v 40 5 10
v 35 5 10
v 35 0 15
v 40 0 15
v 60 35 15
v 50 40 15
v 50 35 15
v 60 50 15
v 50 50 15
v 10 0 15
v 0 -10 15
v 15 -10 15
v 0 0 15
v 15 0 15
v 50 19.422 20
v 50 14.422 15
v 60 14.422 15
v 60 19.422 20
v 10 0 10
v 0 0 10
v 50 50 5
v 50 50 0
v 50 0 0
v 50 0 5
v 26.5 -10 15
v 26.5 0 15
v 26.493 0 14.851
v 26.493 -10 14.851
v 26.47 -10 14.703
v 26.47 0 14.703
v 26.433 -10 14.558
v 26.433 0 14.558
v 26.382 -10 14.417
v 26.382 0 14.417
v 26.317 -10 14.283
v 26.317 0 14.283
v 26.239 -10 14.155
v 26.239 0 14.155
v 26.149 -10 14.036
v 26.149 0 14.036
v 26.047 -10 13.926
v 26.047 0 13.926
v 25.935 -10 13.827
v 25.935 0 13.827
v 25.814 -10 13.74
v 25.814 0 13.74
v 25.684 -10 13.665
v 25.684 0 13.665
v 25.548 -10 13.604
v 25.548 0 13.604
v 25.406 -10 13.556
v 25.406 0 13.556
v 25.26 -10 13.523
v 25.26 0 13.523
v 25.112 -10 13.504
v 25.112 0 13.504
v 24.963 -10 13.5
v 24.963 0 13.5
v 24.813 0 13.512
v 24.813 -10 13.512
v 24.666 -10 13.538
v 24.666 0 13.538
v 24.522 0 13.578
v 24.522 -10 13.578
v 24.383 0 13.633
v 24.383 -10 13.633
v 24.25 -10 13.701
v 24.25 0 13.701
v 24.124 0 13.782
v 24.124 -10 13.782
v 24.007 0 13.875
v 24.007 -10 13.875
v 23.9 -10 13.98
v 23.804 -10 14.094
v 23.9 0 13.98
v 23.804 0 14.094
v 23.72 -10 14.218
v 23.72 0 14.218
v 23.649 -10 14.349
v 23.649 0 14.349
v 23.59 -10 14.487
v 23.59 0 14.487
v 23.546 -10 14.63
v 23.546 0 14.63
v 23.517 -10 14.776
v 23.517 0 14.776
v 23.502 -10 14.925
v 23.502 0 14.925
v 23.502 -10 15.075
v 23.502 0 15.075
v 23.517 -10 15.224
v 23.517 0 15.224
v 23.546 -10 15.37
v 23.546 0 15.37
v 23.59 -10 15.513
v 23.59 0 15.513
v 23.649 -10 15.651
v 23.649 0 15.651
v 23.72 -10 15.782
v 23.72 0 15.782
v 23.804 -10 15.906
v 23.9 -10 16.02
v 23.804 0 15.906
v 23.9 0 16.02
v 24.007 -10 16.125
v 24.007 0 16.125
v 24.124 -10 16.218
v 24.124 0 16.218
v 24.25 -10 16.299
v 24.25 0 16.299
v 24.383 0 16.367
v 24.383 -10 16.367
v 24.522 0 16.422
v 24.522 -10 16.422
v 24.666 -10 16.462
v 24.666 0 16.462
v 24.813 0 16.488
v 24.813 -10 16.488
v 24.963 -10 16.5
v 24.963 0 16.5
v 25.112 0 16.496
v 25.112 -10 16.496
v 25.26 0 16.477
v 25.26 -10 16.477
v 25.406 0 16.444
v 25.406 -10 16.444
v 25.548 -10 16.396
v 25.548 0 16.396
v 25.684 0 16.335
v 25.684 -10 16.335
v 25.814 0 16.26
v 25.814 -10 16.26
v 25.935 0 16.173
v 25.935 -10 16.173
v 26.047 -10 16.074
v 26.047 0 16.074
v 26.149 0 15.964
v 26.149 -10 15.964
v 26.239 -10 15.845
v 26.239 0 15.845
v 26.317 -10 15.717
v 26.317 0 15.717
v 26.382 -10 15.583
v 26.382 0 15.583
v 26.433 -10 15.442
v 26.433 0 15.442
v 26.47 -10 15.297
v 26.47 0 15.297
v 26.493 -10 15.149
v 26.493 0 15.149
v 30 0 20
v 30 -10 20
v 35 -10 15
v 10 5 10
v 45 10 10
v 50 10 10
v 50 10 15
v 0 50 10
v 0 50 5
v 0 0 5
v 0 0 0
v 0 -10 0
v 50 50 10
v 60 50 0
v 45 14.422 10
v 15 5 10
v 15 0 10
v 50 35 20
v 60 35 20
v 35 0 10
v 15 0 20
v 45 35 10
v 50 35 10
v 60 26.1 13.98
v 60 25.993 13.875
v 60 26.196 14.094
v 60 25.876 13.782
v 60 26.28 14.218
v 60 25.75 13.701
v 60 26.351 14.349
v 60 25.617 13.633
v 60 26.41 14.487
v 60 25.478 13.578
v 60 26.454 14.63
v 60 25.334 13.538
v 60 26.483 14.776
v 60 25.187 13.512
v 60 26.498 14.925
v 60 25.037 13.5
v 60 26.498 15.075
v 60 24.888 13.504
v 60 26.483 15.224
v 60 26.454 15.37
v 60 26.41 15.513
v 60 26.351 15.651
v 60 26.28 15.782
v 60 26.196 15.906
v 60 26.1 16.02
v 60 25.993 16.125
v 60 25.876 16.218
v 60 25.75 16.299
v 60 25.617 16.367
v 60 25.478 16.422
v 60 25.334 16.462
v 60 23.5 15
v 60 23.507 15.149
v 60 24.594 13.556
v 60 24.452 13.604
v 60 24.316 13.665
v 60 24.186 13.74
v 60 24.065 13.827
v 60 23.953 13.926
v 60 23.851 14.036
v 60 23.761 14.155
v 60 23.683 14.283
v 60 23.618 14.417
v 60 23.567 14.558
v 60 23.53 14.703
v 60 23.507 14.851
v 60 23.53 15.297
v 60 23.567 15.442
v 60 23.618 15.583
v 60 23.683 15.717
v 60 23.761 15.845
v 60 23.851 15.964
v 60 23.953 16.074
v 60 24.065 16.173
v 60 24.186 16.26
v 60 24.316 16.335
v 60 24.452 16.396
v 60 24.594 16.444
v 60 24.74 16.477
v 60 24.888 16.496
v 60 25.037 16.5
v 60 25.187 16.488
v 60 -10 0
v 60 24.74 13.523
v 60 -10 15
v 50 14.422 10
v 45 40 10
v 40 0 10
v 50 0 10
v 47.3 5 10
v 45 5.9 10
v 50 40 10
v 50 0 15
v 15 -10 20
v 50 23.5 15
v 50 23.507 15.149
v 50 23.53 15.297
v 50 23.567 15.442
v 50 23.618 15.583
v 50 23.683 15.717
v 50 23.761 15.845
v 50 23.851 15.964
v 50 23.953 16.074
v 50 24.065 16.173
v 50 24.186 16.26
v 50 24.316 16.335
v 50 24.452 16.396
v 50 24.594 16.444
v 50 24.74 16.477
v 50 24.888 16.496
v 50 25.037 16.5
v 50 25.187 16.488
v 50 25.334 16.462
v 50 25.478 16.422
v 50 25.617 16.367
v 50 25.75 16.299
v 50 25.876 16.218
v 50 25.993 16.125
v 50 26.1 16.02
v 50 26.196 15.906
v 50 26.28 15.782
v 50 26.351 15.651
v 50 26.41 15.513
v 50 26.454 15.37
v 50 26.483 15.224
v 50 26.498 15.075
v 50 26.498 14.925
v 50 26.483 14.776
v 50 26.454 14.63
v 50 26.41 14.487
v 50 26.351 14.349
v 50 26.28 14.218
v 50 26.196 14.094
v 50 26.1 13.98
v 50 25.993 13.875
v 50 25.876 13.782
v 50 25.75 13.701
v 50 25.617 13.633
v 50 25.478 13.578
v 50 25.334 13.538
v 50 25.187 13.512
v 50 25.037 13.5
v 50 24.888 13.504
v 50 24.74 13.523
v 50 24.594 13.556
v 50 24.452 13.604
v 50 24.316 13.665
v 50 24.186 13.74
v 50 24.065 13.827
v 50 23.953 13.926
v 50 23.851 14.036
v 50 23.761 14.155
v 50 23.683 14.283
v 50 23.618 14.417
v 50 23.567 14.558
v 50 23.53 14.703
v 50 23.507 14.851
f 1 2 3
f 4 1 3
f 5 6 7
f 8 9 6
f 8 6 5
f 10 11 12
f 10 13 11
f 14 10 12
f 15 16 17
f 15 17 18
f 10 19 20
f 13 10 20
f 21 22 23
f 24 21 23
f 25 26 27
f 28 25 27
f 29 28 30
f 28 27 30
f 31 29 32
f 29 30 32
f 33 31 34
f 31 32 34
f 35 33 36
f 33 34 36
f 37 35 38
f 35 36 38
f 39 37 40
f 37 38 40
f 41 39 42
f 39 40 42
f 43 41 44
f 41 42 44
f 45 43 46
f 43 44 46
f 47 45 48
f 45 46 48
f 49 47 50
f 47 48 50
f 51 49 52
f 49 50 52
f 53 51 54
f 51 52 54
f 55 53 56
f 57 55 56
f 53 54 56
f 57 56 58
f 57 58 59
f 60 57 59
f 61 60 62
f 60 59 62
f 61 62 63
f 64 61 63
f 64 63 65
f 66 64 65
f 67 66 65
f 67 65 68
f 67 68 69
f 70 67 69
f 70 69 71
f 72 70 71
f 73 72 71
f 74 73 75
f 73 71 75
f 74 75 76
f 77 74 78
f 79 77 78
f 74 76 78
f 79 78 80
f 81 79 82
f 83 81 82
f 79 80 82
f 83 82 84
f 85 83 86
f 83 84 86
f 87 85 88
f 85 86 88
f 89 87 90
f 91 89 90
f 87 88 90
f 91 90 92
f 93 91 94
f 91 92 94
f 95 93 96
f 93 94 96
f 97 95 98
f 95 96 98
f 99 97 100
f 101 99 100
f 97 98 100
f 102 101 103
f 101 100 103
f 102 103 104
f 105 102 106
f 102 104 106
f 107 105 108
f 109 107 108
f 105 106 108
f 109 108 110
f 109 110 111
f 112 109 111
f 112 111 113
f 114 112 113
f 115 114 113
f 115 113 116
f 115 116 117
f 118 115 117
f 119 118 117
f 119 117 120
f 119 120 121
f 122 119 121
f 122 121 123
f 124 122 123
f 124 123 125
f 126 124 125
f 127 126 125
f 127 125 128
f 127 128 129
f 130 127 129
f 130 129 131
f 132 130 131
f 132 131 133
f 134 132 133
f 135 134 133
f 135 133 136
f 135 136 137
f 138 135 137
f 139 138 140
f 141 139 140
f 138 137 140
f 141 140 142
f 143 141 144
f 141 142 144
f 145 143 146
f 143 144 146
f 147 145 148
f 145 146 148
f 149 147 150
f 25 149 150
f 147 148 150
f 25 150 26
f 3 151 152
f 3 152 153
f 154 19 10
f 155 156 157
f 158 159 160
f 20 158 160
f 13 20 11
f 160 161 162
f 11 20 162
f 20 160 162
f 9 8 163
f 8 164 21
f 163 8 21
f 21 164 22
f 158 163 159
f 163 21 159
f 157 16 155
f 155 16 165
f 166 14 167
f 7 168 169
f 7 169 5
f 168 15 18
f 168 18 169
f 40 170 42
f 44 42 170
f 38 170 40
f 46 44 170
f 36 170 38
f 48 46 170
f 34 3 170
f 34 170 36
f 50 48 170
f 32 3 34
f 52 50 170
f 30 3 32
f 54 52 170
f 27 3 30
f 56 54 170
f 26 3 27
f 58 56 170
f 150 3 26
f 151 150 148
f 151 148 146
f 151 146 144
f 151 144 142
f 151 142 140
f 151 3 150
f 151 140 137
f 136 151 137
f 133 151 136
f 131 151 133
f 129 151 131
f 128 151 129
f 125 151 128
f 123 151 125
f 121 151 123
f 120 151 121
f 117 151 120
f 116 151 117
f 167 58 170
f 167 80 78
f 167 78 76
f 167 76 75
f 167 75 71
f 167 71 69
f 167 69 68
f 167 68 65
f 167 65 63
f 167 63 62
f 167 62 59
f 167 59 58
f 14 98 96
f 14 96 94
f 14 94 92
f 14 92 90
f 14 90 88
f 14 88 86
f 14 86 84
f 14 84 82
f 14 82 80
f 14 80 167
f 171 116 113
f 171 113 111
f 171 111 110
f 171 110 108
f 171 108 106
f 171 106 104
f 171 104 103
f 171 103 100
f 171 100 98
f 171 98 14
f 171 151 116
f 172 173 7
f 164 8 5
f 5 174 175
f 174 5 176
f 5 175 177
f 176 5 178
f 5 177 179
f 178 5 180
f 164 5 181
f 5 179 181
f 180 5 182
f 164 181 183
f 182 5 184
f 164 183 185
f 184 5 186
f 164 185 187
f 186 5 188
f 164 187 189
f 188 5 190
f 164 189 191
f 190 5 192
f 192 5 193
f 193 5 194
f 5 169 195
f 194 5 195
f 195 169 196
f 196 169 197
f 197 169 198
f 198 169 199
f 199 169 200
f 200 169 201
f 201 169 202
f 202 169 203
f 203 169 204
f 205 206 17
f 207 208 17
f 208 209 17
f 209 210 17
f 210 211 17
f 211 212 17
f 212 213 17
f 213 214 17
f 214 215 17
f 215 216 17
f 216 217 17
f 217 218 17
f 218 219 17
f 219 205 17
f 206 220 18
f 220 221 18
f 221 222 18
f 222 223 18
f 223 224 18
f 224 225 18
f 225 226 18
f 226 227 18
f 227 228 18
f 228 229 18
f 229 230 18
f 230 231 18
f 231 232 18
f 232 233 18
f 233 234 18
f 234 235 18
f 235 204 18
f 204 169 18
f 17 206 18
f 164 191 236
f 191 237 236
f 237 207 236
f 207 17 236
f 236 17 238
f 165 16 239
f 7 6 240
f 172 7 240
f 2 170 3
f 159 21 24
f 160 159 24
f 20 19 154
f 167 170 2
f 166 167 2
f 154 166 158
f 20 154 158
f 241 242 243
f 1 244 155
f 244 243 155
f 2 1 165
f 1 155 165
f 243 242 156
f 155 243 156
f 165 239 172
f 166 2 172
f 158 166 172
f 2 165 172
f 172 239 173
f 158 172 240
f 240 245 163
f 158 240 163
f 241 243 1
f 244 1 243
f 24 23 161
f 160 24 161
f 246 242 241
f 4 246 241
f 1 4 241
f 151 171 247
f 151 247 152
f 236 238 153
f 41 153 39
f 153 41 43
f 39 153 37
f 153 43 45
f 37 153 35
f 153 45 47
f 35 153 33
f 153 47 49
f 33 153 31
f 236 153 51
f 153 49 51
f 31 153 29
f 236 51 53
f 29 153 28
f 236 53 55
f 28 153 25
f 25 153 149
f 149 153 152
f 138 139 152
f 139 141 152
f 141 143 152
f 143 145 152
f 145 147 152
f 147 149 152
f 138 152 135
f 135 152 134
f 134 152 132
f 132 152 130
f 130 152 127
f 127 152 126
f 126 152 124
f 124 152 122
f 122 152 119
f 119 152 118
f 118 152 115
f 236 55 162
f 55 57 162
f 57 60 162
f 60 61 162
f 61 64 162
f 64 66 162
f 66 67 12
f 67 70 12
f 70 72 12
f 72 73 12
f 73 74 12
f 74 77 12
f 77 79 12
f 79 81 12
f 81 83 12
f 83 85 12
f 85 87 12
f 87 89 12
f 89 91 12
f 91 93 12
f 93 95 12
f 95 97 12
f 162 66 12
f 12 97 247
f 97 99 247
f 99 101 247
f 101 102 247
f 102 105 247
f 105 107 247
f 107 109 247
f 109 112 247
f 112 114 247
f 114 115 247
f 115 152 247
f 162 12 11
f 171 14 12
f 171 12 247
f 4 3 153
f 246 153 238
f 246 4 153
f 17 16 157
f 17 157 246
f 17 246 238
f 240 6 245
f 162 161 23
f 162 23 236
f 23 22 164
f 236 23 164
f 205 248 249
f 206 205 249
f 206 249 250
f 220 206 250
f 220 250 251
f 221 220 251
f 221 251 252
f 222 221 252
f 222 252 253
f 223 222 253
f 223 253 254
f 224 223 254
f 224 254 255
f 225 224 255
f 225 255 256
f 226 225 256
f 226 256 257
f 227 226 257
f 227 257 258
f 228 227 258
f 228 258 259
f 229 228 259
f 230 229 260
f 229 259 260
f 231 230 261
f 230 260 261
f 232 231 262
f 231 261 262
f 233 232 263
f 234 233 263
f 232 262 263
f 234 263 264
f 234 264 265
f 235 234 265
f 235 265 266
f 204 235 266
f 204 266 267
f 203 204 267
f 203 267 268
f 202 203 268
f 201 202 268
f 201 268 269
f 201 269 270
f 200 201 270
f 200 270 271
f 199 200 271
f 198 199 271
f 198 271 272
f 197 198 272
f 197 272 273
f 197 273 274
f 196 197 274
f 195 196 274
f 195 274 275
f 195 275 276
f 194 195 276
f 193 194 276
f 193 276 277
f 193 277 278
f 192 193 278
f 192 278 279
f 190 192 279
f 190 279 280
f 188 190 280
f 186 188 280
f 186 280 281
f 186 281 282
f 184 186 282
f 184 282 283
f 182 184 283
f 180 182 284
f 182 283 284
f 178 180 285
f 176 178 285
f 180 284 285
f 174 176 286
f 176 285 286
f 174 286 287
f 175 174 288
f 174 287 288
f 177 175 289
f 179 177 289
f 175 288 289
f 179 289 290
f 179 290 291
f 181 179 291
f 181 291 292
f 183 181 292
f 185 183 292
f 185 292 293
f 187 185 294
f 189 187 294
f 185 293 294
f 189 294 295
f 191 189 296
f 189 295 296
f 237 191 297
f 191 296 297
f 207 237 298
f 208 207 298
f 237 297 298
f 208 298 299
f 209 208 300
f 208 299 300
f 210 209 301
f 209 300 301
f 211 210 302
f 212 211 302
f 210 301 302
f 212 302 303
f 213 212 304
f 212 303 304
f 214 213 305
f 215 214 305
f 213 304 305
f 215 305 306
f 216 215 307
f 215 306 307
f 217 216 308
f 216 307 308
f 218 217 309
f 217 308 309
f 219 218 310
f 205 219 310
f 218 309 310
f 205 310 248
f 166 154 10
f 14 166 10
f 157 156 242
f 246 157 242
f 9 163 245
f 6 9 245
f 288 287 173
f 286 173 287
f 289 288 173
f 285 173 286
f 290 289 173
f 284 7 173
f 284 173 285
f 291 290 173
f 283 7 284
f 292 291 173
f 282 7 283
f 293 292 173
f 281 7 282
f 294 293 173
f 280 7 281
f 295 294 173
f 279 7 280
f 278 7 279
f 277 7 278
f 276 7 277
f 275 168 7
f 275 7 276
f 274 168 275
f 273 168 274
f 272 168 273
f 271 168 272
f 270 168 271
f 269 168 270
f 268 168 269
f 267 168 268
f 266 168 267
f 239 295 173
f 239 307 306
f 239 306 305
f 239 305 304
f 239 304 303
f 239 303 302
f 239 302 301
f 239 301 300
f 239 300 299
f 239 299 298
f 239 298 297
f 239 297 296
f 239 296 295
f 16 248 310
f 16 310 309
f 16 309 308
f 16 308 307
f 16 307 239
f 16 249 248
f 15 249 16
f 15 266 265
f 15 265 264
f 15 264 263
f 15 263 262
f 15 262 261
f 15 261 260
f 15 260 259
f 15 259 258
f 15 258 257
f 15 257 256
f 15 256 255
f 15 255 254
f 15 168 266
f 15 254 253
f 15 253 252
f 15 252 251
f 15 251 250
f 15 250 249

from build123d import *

# Parameters (mm, degrees)
F1_DEPTH  = 15
F3_DEPTH  = 50
F4_DEPTH  = 5
F6_DEPTH  = 34.1
F8_DEPTH  = 5
F10_DEPTH = 37.3
F11_DEPTH = 10
F12_DEPTH = 10
F13_DEPTH = 25
F14_DEPTH = 25


with BuildPart() as f1:
    # F0 (on Top) → F1 (new body)
    with BuildSketch(Plane.XY):
        Polygon((50, 0), (0, 0), (0, -10), (60, -10), (60, 50), (50, 50), align=None)
    extrude(amount=F1_DEPTH)

    # F2 (on face) → F3 (join)
    with BuildSketch(Plane(origin=(50, 0, 0), x_dir=(0, -1, 0), z_dir=(-1, 0, 0))):
        Polygon((-50, 10), (-50, 5), (0, 5), (0, 10), (-10, 10), (-14.4219835103, 10), (-35, 10), (-40, 10), align=None)
    extrude(amount=F3_DEPTH)

    # F2 (on face) → F4 (join)
    with BuildSketch(Plane(origin=(50, 0, 0), x_dir=(0, -1, 0), z_dir=(-1, 0, 0))):
        Polygon((-40, 15), (-40, 10), (-35, 10), (-35, 15), (-37.5, 15), align=None)
        Polygon((-14.4219835103, 10), (-10, 10), (-10, 15), (-12.5, 15), (-14.4219835103, 15), align=None)
    extrude(amount=F4_DEPTH)

    # F5 (on face) → F6 (cut)
    with BuildSketch(Plane(origin=(0, 40, 0), x_dir=(-1, 0, 0), z_dir=(0, 1, 0))):
        Polygon((-45, 15), (-50, 15), (-45, 10), align=None)
    extrude(amount=-F6_DEPTH, mode=Mode.SUBTRACT)

    # F7 (on face) → F8 (join)
    with BuildSketch(Plane(origin=(0, 0, 0), x_dir=(-1, 0, 0), z_dir=(0, 1, 0))):
        Polygon((-40, 15), (-40, 10), (-35, 10), (-35, 15), (-37.5, 15), align=None)
        Polygon((-15, 15), (-15, 10), (-10, 10), (-10, 15), (-12.5, 15), align=None)
    extrude(amount=F8_DEPTH)

    # F9 (on face) → F10 (cut)
    with BuildSketch(Plane(origin=(10, 0, 0), x_dir=(0, -1, 0), z_dir=(-1, 0, 0))):
        Polygon((-5, 15), (-5, 10), (0, 15), align=None)
    extrude(amount=-F10_DEPTH, mode=Mode.SUBTRACT)

    # F2 (on face) → F11 (join)
    with BuildSketch(Plane(origin=(50, 0, 0), x_dir=(0, -1, 0), z_dir=(-1, 0, 0))):
        with BuildLine():
            Line((-35, 20), (-35, 15))
            Line((-35, 15), (-26.5, 15))
            ThreePointArc((-26.5, 15), (-25, 16.5), (-23.5, 15))
            Line((-23.5, 15), (-14.4219835103, 15))
            Line((-14.4219835103, 15), (-19.4219835103, 20))
            Line((-19.4219835103, 20), (-35, 20))
        make_face()
    extrude(amount=-F11_DEPTH)

    # F7 (on face) → F12 (join)
    with BuildSketch(Plane(origin=(0, 0, 0), x_dir=(-1, 0, 0), z_dir=(0, 1, 0))):
        with BuildLine():
            Line((-30, 20), (-35, 15))
            Line((-35, 15), (-26.5, 15))
            ThreePointArc((-26.5, 15), (-25, 16.5), (-23.5, 15))
            Line((-23.5, 15), (-15, 15))
            Line((-15, 15), (-15, 20))
            Line((-15, 20), (-30, 20))
        make_face()
    extrude(amount=-F12_DEPTH)

    # F2 (on face) → F13 (cut)
    with BuildSketch(Plane(origin=(50, 0, 0), x_dir=(0, -1, 0), z_dir=(-1, 0, 0))):
        with BuildLine():
            Line((-23.5, 15), (-26.5, 15))
            ThreePointArc((-26.5, 15), (-25, 13.5), (-23.5, 15))
        make_face()
        with BuildLine():
            ThreePointArc((-23.5, 15), (-25, 16.5), (-26.5, 15))
            Line((-26.5, 15), (-23.5, 15))
        make_face()
    extrude(amount=-F13_DEPTH, mode=Mode.SUBTRACT)

    # F7 (on face) → F14 (cut)
    with BuildSketch(Plane(origin=(0, 0, 0), x_dir=(-1, 0, 0), z_dir=(0, 1, 0))):
        with BuildLine():
            ThreePointArc((-23.5, 15), (-25, 16.5), (-26.5, 15))
            Line((-26.5, 15), (-23.5, 15))
        make_face()
        with BuildLine():
            Line((-23.5, 15), (-26.5, 15))
            ThreePointArc((-26.5, 15), (-25, 13.5), (-23.5, 15))
        make_face()
    extrude(amount=-F14_DEPTH, mode=Mode.SUBTRACT)


solid = f1.part
